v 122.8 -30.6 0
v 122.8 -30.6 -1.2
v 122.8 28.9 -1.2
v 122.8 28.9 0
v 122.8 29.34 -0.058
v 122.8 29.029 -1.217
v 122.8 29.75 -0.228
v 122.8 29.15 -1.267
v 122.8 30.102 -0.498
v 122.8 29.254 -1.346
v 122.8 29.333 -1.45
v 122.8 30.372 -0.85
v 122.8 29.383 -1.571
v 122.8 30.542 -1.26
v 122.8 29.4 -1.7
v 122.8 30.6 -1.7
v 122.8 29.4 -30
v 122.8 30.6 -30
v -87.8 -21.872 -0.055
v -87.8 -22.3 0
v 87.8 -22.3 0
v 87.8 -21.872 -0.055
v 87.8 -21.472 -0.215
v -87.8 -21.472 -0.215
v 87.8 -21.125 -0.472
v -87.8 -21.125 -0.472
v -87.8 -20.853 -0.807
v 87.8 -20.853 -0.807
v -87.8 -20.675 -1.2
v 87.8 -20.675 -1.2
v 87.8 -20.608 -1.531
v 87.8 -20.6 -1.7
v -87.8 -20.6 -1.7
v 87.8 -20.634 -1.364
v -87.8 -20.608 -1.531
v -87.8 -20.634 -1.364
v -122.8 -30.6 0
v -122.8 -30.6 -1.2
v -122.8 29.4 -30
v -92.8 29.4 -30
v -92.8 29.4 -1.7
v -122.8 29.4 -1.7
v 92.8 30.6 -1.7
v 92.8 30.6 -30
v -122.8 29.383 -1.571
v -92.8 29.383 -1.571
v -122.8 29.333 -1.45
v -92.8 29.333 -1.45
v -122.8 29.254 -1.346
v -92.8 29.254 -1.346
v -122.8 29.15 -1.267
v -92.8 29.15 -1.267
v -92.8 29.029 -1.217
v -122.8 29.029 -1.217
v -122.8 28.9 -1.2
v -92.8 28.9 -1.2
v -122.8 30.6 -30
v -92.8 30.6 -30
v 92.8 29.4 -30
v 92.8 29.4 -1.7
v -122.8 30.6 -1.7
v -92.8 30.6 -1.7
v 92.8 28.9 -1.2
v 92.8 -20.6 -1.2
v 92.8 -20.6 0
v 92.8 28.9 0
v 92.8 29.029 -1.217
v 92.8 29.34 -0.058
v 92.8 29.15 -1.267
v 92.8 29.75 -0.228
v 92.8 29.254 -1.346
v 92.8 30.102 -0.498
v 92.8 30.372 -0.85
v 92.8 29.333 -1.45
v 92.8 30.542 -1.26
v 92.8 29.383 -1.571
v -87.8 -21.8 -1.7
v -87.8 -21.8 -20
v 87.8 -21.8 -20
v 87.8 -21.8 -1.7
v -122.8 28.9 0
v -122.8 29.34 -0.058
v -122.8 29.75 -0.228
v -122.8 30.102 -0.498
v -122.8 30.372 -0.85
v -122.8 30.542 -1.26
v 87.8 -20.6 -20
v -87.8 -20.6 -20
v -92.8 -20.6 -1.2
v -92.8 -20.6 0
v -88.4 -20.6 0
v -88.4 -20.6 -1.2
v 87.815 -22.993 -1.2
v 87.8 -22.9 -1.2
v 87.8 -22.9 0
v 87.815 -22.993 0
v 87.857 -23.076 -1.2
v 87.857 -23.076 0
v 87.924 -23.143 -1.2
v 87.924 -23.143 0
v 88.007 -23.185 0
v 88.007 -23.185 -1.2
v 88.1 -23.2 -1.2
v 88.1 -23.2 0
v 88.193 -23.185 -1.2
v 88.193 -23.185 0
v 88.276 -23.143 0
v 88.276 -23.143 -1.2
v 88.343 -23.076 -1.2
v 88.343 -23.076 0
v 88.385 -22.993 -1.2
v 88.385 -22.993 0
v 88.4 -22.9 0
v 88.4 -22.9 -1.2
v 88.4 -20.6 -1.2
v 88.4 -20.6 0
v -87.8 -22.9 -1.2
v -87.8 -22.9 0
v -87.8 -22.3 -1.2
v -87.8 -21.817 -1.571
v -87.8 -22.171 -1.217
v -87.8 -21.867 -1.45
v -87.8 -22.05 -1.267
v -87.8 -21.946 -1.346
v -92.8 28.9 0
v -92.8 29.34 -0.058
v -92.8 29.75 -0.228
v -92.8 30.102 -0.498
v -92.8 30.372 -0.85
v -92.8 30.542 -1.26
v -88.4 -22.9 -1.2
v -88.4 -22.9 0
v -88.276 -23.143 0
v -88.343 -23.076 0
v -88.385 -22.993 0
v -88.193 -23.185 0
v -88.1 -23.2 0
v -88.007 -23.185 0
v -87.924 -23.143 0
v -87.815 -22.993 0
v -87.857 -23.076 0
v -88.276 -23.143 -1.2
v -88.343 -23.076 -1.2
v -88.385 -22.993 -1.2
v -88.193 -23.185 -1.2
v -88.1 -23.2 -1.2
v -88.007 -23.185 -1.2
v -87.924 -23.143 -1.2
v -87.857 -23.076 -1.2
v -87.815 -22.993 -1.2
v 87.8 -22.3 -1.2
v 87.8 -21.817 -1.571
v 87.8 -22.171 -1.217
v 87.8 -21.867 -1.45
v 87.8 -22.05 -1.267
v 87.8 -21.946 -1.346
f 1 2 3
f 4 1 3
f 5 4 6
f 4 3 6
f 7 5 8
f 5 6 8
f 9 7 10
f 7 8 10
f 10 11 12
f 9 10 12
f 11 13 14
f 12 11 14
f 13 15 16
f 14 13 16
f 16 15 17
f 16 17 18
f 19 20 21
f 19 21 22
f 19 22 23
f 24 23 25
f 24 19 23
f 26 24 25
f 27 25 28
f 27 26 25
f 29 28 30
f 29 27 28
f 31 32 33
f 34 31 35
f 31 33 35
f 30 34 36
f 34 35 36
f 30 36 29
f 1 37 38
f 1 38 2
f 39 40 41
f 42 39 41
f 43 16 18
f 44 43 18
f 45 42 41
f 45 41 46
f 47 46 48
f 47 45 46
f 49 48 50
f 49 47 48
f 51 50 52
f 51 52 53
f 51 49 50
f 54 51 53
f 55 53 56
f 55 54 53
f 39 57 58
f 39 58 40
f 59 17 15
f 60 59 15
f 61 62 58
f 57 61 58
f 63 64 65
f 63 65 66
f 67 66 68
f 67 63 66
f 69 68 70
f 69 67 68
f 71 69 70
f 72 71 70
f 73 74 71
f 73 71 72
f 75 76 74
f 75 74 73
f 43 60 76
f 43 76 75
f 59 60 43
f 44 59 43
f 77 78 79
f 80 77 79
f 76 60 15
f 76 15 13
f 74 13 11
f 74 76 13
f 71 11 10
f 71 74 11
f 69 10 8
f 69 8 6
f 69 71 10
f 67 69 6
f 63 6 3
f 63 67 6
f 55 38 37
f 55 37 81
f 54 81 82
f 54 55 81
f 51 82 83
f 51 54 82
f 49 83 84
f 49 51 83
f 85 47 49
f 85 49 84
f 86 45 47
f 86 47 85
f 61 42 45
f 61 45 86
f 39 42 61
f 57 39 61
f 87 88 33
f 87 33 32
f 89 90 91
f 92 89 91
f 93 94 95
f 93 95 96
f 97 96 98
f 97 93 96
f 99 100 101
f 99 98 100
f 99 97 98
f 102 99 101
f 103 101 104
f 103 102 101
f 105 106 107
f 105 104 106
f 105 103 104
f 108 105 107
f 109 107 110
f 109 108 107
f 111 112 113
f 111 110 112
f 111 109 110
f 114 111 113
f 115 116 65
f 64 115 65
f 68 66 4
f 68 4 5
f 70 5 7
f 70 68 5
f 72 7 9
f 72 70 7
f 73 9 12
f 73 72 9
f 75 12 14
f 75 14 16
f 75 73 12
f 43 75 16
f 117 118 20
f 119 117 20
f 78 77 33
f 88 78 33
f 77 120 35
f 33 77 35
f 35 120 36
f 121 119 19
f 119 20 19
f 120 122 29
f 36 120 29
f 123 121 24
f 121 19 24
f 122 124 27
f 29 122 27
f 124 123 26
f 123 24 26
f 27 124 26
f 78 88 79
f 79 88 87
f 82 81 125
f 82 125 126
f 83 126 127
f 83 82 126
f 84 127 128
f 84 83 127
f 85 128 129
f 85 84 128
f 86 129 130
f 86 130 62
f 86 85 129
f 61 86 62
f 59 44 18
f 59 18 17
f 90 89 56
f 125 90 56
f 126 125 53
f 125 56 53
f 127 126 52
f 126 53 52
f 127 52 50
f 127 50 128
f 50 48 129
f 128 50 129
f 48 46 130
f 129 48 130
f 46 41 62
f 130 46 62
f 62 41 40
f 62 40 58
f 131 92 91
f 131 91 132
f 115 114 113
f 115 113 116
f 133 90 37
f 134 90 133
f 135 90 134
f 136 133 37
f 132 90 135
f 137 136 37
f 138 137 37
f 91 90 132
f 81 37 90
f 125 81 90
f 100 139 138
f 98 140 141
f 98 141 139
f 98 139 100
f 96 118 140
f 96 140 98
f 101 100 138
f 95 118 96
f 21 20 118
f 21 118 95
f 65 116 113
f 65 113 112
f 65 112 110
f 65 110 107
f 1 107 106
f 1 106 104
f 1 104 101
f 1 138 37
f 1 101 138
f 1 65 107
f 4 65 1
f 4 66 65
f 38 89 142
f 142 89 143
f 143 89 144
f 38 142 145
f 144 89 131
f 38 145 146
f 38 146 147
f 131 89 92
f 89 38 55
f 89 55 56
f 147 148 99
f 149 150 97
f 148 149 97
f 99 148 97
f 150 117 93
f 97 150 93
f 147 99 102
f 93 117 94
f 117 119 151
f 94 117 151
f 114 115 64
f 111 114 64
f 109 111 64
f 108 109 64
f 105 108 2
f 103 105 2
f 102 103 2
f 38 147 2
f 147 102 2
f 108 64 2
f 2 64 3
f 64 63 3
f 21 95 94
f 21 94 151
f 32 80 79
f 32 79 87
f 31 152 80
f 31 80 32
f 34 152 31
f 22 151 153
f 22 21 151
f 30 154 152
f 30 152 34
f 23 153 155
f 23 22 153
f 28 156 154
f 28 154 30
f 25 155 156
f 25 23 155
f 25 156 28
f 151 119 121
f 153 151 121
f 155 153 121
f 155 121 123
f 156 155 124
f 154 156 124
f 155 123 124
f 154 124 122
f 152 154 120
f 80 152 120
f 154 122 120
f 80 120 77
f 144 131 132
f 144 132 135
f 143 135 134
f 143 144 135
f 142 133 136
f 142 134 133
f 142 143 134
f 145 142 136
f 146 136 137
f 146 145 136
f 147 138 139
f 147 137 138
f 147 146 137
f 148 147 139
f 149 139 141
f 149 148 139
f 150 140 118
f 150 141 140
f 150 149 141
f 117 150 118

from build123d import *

# Parameters (mm, degrees)
SKETCH_2_W                         = 245.6
SKETCH_2_H                         = 61.2
SM_BASE_FLANGE_1_DEPTH             = 1.2
SKETCH_8_W                         = 185.6
SKETCH_8_H                         = 51.2
CUT_EXTRUDE_1_DEPTH                = 10
SM_EDGE_FLANGE_1_STRIP_W           = 5.8
SM_EDGE_FLANGE_1_STRIP_H           = 1.2
SM_EDGE_FLANGE_1_STRIP_CUT_DEPTH   = 30
SM_EDGE_FLANGE_1_STRIP_2_W         = 5.8
SM_EDGE_FLANGE_1_STRIP_2_H         = 1.2
SM_EDGE_FLANGE_1_STRIP_CUT_2_DEPTH = 30
SM_EDGE_FLANGE_1_DEPTH             = 30
SM_EDGE_FLANGE_1_BEND_DEPTH        = 30
SM_START                           = -1.7
SM_EDGE_FLANGE_2_DEPTH             = 2.7
SM_START_2                         = -20
SM_EDGE_FLANGE_2_2_OUTLINE_W       = 175.6
SM_EDGE_FLANGE_2_2_OUTLINE_H       = 1.2
SM_EDGE_FLANGE_2_2_DEPTH           = 18.3
SM_START_3                         = -87.8
SM_EDGE_FLANGE_2_3_DEPTH           = 175.6
SM_EDGE_FLANGE_2_4_DEPTH           = 175.6


with BuildPart() as part:
    # 基体-法兰1: sheet metal written as solids
    # Sketch 2 → 基体-法兰1 (new body)
    with BuildSketch(Plane.XY):
        Rectangle(SKETCH_2_W, SKETCH_2_H)
    extrude(amount=-SM_BASE_FLANGE_1_DEPTH)

    # 草图8 → 切除-拉伸1 (cut)
    with BuildSketch(Plane.XY):
        with Locations((0, 5)):
            Rectangle(SKETCH_8_W, SKETCH_8_H)
    extrude(amount=-CUT_EXTRUDE_1_DEPTH, mode=Mode.SUBTRACT)

    # 边线-法兰1: sheet metal written as solids
    # 边线-法兰1 strip (on a plane across the edge) → 边线-法兰1 strip cut (cut)
    with BuildSketch(Plane(origin=(92.8, 30.6, -1.2), x_dir=(0, -1, 0), z_dir=(1, 0, 0))):
        with Locations((-1.2, -0.6)):
            Rectangle(SM_EDGE_FLANGE_1_STRIP_W, SM_EDGE_FLANGE_1_STRIP_H)
    extrude(amount=SM_EDGE_FLANGE_1_STRIP_CUT_DEPTH, mode=Mode.SUBTRACT)

    # 边线-法兰1 strip 2 (on a plane across the edge) → 边线-法兰1 strip cut 2 (cut)
    with BuildSketch(Plane(origin=(-122.8, 30.6, -1.2), x_dir=(0, -1, 0), z_dir=(1, 0, 0))):
        with Locations((-1.2, -0.6)):
            Rectangle(SM_EDGE_FLANGE_1_STRIP_2_W, SM_EDGE_FLANGE_1_STRIP_2_H)
    extrude(amount=SM_EDGE_FLANGE_1_STRIP_CUT_2_DEPTH, mode=Mode.SUBTRACT)

    # 边线-法兰1 section (on a plane across the edge) → 边线-法兰1 (add)
    with BuildSketch(Plane(origin=(92.8, 30.6, -1.2), x_dir=(0, -1, 0), z_dir=(1, 0, 0))):
        with BuildLine():
            Line((0, 0.5), (0, 28.8))
            Line((0, 28.8), (1.2, 28.8))
            Line((1.2, 28.8), (1.2, 0.5))
            ThreePointArc((1.2, 0.5), (1.346446609, 0.146446609), (1.7, 0))
            Line((1.7, 0), (1.7, -1.2))
            ThreePointArc((1.7, -1.2), (0.497918472, -0.702081528), (0, 0.5))
        make_face()
    extrude(amount=SM_EDGE_FLANGE_1_DEPTH)

    # 边线-法兰1 section 2 (on a plane across the edge) → 边线-法兰1 bend (add)
    with BuildSketch(Plane(origin=(-122.8, 30.6, -1.2), x_dir=(0, -1, 0), z_dir=(1, 0, 0))):
        with BuildLine():
            Line((0, 0.5), (0, 28.8))
            Line((0, 28.8), (1.2, 28.8))
            Line((1.2, 28.8), (1.2, 0.5))
            ThreePointArc((1.2, 0.5), (1.346446609, 0.146446609), (1.7, 0))
            Line((1.7, 0), (1.7, -1.2))
            ThreePointArc((1.7, -1.2), (0.497918472, -0.702081528), (0, 0.5))
        make_face()
    extrude(amount=SM_EDGE_FLANGE_1_BEND_DEPTH)

    # 边线-法兰2: read off the stored shape, not the designer's step
    # 边线-法兰2 outline → 边线-法兰2 (cut)
    with BuildSketch(Plane.XY.offset(SM_START)):
        with BuildLine():
            Line((-87.8, -22.9), (-87.8, -20.6))
            Line((-87.8, -20.6), (-88.4, -20.6))
            Line((-88.4, -20.6), (-88.4, -22.9))
            ThreePointArc((-88.4, -22.9), (-88.1, -23.2), (-87.8, -22.9))
        make_face()
        with BuildLine():
            Line((88.4, -20.6), (87.8, -20.6))
            Line((87.8, -20.6), (87.8, -22.9))
            ThreePointArc((87.8, -22.9), (88.1, -23.2), (88.4, -22.9))
            Line((88.4, -22.9), (88.4, -20.6))
        make_face()
    extrude(amount=SM_EDGE_FLANGE_2_DEPTH, mode=Mode.SUBTRACT)

    # Sm Edge Flange 2 3 outline → Sm Edge Flange 2 3 (cut)
    with BuildSketch(Plane.YZ.offset(SM_START_3)):
        with BuildLine():
            ThreePointArc((-22.3, 0), (-21.290049506, -0.332520567), (-20.675192319, -1.2))
            Line((-20.675192319, -1.2), (-20.6, -1.2))
            Line((-20.6, -1.2), (-20.6, 0))
            Line((-20.6, 0), (-22.3, 0))
        make_face()
    extrude(amount=SM_EDGE_FLANGE_2_3_DEPTH, mode=Mode.SUBTRACT)



with BuildPart() as body_2:
    # Sm Edge Flange 2 2 outline → Sm Edge Flange 2 2 (new body)
    with BuildSketch(Plane.XY.offset(SM_START_2)):
        with Locations((0, -21.2)):
            Rectangle(SM_EDGE_FLANGE_2_2_OUTLINE_W, SM_EDGE_FLANGE_2_2_OUTLINE_H)
    extrude(amount=SM_EDGE_FLANGE_2_2_DEPTH)


with BuildPart() as part_1:
    add(part.part)

    add(body_2.part)  # Sm Edge Flange 2 4 merges body 2
    # Sm Edge Flange 2 4 outline → Sm Edge Flange 2 4 (add)
    with BuildSketch(Plane.YZ.offset(SM_START_3)):
        with BuildLine():
            Line((-21.8, -1.7), (-20.6, -1.7))
            ThreePointArc((-20.6, -1.7), (-20.618903177, -1.447188863), (-20.675192319, -1.2))
            Line((-20.675192319, -1.2), (-22.3, -1.2))
            ThreePointArc((-22.3, -1.2), (-21.946446609, -1.346446609), (-21.8, -1.7))
        make_face()
    extrude(amount=SM_EDGE_FLANGE_2_4_DEPTH)


solid = part_1.part
